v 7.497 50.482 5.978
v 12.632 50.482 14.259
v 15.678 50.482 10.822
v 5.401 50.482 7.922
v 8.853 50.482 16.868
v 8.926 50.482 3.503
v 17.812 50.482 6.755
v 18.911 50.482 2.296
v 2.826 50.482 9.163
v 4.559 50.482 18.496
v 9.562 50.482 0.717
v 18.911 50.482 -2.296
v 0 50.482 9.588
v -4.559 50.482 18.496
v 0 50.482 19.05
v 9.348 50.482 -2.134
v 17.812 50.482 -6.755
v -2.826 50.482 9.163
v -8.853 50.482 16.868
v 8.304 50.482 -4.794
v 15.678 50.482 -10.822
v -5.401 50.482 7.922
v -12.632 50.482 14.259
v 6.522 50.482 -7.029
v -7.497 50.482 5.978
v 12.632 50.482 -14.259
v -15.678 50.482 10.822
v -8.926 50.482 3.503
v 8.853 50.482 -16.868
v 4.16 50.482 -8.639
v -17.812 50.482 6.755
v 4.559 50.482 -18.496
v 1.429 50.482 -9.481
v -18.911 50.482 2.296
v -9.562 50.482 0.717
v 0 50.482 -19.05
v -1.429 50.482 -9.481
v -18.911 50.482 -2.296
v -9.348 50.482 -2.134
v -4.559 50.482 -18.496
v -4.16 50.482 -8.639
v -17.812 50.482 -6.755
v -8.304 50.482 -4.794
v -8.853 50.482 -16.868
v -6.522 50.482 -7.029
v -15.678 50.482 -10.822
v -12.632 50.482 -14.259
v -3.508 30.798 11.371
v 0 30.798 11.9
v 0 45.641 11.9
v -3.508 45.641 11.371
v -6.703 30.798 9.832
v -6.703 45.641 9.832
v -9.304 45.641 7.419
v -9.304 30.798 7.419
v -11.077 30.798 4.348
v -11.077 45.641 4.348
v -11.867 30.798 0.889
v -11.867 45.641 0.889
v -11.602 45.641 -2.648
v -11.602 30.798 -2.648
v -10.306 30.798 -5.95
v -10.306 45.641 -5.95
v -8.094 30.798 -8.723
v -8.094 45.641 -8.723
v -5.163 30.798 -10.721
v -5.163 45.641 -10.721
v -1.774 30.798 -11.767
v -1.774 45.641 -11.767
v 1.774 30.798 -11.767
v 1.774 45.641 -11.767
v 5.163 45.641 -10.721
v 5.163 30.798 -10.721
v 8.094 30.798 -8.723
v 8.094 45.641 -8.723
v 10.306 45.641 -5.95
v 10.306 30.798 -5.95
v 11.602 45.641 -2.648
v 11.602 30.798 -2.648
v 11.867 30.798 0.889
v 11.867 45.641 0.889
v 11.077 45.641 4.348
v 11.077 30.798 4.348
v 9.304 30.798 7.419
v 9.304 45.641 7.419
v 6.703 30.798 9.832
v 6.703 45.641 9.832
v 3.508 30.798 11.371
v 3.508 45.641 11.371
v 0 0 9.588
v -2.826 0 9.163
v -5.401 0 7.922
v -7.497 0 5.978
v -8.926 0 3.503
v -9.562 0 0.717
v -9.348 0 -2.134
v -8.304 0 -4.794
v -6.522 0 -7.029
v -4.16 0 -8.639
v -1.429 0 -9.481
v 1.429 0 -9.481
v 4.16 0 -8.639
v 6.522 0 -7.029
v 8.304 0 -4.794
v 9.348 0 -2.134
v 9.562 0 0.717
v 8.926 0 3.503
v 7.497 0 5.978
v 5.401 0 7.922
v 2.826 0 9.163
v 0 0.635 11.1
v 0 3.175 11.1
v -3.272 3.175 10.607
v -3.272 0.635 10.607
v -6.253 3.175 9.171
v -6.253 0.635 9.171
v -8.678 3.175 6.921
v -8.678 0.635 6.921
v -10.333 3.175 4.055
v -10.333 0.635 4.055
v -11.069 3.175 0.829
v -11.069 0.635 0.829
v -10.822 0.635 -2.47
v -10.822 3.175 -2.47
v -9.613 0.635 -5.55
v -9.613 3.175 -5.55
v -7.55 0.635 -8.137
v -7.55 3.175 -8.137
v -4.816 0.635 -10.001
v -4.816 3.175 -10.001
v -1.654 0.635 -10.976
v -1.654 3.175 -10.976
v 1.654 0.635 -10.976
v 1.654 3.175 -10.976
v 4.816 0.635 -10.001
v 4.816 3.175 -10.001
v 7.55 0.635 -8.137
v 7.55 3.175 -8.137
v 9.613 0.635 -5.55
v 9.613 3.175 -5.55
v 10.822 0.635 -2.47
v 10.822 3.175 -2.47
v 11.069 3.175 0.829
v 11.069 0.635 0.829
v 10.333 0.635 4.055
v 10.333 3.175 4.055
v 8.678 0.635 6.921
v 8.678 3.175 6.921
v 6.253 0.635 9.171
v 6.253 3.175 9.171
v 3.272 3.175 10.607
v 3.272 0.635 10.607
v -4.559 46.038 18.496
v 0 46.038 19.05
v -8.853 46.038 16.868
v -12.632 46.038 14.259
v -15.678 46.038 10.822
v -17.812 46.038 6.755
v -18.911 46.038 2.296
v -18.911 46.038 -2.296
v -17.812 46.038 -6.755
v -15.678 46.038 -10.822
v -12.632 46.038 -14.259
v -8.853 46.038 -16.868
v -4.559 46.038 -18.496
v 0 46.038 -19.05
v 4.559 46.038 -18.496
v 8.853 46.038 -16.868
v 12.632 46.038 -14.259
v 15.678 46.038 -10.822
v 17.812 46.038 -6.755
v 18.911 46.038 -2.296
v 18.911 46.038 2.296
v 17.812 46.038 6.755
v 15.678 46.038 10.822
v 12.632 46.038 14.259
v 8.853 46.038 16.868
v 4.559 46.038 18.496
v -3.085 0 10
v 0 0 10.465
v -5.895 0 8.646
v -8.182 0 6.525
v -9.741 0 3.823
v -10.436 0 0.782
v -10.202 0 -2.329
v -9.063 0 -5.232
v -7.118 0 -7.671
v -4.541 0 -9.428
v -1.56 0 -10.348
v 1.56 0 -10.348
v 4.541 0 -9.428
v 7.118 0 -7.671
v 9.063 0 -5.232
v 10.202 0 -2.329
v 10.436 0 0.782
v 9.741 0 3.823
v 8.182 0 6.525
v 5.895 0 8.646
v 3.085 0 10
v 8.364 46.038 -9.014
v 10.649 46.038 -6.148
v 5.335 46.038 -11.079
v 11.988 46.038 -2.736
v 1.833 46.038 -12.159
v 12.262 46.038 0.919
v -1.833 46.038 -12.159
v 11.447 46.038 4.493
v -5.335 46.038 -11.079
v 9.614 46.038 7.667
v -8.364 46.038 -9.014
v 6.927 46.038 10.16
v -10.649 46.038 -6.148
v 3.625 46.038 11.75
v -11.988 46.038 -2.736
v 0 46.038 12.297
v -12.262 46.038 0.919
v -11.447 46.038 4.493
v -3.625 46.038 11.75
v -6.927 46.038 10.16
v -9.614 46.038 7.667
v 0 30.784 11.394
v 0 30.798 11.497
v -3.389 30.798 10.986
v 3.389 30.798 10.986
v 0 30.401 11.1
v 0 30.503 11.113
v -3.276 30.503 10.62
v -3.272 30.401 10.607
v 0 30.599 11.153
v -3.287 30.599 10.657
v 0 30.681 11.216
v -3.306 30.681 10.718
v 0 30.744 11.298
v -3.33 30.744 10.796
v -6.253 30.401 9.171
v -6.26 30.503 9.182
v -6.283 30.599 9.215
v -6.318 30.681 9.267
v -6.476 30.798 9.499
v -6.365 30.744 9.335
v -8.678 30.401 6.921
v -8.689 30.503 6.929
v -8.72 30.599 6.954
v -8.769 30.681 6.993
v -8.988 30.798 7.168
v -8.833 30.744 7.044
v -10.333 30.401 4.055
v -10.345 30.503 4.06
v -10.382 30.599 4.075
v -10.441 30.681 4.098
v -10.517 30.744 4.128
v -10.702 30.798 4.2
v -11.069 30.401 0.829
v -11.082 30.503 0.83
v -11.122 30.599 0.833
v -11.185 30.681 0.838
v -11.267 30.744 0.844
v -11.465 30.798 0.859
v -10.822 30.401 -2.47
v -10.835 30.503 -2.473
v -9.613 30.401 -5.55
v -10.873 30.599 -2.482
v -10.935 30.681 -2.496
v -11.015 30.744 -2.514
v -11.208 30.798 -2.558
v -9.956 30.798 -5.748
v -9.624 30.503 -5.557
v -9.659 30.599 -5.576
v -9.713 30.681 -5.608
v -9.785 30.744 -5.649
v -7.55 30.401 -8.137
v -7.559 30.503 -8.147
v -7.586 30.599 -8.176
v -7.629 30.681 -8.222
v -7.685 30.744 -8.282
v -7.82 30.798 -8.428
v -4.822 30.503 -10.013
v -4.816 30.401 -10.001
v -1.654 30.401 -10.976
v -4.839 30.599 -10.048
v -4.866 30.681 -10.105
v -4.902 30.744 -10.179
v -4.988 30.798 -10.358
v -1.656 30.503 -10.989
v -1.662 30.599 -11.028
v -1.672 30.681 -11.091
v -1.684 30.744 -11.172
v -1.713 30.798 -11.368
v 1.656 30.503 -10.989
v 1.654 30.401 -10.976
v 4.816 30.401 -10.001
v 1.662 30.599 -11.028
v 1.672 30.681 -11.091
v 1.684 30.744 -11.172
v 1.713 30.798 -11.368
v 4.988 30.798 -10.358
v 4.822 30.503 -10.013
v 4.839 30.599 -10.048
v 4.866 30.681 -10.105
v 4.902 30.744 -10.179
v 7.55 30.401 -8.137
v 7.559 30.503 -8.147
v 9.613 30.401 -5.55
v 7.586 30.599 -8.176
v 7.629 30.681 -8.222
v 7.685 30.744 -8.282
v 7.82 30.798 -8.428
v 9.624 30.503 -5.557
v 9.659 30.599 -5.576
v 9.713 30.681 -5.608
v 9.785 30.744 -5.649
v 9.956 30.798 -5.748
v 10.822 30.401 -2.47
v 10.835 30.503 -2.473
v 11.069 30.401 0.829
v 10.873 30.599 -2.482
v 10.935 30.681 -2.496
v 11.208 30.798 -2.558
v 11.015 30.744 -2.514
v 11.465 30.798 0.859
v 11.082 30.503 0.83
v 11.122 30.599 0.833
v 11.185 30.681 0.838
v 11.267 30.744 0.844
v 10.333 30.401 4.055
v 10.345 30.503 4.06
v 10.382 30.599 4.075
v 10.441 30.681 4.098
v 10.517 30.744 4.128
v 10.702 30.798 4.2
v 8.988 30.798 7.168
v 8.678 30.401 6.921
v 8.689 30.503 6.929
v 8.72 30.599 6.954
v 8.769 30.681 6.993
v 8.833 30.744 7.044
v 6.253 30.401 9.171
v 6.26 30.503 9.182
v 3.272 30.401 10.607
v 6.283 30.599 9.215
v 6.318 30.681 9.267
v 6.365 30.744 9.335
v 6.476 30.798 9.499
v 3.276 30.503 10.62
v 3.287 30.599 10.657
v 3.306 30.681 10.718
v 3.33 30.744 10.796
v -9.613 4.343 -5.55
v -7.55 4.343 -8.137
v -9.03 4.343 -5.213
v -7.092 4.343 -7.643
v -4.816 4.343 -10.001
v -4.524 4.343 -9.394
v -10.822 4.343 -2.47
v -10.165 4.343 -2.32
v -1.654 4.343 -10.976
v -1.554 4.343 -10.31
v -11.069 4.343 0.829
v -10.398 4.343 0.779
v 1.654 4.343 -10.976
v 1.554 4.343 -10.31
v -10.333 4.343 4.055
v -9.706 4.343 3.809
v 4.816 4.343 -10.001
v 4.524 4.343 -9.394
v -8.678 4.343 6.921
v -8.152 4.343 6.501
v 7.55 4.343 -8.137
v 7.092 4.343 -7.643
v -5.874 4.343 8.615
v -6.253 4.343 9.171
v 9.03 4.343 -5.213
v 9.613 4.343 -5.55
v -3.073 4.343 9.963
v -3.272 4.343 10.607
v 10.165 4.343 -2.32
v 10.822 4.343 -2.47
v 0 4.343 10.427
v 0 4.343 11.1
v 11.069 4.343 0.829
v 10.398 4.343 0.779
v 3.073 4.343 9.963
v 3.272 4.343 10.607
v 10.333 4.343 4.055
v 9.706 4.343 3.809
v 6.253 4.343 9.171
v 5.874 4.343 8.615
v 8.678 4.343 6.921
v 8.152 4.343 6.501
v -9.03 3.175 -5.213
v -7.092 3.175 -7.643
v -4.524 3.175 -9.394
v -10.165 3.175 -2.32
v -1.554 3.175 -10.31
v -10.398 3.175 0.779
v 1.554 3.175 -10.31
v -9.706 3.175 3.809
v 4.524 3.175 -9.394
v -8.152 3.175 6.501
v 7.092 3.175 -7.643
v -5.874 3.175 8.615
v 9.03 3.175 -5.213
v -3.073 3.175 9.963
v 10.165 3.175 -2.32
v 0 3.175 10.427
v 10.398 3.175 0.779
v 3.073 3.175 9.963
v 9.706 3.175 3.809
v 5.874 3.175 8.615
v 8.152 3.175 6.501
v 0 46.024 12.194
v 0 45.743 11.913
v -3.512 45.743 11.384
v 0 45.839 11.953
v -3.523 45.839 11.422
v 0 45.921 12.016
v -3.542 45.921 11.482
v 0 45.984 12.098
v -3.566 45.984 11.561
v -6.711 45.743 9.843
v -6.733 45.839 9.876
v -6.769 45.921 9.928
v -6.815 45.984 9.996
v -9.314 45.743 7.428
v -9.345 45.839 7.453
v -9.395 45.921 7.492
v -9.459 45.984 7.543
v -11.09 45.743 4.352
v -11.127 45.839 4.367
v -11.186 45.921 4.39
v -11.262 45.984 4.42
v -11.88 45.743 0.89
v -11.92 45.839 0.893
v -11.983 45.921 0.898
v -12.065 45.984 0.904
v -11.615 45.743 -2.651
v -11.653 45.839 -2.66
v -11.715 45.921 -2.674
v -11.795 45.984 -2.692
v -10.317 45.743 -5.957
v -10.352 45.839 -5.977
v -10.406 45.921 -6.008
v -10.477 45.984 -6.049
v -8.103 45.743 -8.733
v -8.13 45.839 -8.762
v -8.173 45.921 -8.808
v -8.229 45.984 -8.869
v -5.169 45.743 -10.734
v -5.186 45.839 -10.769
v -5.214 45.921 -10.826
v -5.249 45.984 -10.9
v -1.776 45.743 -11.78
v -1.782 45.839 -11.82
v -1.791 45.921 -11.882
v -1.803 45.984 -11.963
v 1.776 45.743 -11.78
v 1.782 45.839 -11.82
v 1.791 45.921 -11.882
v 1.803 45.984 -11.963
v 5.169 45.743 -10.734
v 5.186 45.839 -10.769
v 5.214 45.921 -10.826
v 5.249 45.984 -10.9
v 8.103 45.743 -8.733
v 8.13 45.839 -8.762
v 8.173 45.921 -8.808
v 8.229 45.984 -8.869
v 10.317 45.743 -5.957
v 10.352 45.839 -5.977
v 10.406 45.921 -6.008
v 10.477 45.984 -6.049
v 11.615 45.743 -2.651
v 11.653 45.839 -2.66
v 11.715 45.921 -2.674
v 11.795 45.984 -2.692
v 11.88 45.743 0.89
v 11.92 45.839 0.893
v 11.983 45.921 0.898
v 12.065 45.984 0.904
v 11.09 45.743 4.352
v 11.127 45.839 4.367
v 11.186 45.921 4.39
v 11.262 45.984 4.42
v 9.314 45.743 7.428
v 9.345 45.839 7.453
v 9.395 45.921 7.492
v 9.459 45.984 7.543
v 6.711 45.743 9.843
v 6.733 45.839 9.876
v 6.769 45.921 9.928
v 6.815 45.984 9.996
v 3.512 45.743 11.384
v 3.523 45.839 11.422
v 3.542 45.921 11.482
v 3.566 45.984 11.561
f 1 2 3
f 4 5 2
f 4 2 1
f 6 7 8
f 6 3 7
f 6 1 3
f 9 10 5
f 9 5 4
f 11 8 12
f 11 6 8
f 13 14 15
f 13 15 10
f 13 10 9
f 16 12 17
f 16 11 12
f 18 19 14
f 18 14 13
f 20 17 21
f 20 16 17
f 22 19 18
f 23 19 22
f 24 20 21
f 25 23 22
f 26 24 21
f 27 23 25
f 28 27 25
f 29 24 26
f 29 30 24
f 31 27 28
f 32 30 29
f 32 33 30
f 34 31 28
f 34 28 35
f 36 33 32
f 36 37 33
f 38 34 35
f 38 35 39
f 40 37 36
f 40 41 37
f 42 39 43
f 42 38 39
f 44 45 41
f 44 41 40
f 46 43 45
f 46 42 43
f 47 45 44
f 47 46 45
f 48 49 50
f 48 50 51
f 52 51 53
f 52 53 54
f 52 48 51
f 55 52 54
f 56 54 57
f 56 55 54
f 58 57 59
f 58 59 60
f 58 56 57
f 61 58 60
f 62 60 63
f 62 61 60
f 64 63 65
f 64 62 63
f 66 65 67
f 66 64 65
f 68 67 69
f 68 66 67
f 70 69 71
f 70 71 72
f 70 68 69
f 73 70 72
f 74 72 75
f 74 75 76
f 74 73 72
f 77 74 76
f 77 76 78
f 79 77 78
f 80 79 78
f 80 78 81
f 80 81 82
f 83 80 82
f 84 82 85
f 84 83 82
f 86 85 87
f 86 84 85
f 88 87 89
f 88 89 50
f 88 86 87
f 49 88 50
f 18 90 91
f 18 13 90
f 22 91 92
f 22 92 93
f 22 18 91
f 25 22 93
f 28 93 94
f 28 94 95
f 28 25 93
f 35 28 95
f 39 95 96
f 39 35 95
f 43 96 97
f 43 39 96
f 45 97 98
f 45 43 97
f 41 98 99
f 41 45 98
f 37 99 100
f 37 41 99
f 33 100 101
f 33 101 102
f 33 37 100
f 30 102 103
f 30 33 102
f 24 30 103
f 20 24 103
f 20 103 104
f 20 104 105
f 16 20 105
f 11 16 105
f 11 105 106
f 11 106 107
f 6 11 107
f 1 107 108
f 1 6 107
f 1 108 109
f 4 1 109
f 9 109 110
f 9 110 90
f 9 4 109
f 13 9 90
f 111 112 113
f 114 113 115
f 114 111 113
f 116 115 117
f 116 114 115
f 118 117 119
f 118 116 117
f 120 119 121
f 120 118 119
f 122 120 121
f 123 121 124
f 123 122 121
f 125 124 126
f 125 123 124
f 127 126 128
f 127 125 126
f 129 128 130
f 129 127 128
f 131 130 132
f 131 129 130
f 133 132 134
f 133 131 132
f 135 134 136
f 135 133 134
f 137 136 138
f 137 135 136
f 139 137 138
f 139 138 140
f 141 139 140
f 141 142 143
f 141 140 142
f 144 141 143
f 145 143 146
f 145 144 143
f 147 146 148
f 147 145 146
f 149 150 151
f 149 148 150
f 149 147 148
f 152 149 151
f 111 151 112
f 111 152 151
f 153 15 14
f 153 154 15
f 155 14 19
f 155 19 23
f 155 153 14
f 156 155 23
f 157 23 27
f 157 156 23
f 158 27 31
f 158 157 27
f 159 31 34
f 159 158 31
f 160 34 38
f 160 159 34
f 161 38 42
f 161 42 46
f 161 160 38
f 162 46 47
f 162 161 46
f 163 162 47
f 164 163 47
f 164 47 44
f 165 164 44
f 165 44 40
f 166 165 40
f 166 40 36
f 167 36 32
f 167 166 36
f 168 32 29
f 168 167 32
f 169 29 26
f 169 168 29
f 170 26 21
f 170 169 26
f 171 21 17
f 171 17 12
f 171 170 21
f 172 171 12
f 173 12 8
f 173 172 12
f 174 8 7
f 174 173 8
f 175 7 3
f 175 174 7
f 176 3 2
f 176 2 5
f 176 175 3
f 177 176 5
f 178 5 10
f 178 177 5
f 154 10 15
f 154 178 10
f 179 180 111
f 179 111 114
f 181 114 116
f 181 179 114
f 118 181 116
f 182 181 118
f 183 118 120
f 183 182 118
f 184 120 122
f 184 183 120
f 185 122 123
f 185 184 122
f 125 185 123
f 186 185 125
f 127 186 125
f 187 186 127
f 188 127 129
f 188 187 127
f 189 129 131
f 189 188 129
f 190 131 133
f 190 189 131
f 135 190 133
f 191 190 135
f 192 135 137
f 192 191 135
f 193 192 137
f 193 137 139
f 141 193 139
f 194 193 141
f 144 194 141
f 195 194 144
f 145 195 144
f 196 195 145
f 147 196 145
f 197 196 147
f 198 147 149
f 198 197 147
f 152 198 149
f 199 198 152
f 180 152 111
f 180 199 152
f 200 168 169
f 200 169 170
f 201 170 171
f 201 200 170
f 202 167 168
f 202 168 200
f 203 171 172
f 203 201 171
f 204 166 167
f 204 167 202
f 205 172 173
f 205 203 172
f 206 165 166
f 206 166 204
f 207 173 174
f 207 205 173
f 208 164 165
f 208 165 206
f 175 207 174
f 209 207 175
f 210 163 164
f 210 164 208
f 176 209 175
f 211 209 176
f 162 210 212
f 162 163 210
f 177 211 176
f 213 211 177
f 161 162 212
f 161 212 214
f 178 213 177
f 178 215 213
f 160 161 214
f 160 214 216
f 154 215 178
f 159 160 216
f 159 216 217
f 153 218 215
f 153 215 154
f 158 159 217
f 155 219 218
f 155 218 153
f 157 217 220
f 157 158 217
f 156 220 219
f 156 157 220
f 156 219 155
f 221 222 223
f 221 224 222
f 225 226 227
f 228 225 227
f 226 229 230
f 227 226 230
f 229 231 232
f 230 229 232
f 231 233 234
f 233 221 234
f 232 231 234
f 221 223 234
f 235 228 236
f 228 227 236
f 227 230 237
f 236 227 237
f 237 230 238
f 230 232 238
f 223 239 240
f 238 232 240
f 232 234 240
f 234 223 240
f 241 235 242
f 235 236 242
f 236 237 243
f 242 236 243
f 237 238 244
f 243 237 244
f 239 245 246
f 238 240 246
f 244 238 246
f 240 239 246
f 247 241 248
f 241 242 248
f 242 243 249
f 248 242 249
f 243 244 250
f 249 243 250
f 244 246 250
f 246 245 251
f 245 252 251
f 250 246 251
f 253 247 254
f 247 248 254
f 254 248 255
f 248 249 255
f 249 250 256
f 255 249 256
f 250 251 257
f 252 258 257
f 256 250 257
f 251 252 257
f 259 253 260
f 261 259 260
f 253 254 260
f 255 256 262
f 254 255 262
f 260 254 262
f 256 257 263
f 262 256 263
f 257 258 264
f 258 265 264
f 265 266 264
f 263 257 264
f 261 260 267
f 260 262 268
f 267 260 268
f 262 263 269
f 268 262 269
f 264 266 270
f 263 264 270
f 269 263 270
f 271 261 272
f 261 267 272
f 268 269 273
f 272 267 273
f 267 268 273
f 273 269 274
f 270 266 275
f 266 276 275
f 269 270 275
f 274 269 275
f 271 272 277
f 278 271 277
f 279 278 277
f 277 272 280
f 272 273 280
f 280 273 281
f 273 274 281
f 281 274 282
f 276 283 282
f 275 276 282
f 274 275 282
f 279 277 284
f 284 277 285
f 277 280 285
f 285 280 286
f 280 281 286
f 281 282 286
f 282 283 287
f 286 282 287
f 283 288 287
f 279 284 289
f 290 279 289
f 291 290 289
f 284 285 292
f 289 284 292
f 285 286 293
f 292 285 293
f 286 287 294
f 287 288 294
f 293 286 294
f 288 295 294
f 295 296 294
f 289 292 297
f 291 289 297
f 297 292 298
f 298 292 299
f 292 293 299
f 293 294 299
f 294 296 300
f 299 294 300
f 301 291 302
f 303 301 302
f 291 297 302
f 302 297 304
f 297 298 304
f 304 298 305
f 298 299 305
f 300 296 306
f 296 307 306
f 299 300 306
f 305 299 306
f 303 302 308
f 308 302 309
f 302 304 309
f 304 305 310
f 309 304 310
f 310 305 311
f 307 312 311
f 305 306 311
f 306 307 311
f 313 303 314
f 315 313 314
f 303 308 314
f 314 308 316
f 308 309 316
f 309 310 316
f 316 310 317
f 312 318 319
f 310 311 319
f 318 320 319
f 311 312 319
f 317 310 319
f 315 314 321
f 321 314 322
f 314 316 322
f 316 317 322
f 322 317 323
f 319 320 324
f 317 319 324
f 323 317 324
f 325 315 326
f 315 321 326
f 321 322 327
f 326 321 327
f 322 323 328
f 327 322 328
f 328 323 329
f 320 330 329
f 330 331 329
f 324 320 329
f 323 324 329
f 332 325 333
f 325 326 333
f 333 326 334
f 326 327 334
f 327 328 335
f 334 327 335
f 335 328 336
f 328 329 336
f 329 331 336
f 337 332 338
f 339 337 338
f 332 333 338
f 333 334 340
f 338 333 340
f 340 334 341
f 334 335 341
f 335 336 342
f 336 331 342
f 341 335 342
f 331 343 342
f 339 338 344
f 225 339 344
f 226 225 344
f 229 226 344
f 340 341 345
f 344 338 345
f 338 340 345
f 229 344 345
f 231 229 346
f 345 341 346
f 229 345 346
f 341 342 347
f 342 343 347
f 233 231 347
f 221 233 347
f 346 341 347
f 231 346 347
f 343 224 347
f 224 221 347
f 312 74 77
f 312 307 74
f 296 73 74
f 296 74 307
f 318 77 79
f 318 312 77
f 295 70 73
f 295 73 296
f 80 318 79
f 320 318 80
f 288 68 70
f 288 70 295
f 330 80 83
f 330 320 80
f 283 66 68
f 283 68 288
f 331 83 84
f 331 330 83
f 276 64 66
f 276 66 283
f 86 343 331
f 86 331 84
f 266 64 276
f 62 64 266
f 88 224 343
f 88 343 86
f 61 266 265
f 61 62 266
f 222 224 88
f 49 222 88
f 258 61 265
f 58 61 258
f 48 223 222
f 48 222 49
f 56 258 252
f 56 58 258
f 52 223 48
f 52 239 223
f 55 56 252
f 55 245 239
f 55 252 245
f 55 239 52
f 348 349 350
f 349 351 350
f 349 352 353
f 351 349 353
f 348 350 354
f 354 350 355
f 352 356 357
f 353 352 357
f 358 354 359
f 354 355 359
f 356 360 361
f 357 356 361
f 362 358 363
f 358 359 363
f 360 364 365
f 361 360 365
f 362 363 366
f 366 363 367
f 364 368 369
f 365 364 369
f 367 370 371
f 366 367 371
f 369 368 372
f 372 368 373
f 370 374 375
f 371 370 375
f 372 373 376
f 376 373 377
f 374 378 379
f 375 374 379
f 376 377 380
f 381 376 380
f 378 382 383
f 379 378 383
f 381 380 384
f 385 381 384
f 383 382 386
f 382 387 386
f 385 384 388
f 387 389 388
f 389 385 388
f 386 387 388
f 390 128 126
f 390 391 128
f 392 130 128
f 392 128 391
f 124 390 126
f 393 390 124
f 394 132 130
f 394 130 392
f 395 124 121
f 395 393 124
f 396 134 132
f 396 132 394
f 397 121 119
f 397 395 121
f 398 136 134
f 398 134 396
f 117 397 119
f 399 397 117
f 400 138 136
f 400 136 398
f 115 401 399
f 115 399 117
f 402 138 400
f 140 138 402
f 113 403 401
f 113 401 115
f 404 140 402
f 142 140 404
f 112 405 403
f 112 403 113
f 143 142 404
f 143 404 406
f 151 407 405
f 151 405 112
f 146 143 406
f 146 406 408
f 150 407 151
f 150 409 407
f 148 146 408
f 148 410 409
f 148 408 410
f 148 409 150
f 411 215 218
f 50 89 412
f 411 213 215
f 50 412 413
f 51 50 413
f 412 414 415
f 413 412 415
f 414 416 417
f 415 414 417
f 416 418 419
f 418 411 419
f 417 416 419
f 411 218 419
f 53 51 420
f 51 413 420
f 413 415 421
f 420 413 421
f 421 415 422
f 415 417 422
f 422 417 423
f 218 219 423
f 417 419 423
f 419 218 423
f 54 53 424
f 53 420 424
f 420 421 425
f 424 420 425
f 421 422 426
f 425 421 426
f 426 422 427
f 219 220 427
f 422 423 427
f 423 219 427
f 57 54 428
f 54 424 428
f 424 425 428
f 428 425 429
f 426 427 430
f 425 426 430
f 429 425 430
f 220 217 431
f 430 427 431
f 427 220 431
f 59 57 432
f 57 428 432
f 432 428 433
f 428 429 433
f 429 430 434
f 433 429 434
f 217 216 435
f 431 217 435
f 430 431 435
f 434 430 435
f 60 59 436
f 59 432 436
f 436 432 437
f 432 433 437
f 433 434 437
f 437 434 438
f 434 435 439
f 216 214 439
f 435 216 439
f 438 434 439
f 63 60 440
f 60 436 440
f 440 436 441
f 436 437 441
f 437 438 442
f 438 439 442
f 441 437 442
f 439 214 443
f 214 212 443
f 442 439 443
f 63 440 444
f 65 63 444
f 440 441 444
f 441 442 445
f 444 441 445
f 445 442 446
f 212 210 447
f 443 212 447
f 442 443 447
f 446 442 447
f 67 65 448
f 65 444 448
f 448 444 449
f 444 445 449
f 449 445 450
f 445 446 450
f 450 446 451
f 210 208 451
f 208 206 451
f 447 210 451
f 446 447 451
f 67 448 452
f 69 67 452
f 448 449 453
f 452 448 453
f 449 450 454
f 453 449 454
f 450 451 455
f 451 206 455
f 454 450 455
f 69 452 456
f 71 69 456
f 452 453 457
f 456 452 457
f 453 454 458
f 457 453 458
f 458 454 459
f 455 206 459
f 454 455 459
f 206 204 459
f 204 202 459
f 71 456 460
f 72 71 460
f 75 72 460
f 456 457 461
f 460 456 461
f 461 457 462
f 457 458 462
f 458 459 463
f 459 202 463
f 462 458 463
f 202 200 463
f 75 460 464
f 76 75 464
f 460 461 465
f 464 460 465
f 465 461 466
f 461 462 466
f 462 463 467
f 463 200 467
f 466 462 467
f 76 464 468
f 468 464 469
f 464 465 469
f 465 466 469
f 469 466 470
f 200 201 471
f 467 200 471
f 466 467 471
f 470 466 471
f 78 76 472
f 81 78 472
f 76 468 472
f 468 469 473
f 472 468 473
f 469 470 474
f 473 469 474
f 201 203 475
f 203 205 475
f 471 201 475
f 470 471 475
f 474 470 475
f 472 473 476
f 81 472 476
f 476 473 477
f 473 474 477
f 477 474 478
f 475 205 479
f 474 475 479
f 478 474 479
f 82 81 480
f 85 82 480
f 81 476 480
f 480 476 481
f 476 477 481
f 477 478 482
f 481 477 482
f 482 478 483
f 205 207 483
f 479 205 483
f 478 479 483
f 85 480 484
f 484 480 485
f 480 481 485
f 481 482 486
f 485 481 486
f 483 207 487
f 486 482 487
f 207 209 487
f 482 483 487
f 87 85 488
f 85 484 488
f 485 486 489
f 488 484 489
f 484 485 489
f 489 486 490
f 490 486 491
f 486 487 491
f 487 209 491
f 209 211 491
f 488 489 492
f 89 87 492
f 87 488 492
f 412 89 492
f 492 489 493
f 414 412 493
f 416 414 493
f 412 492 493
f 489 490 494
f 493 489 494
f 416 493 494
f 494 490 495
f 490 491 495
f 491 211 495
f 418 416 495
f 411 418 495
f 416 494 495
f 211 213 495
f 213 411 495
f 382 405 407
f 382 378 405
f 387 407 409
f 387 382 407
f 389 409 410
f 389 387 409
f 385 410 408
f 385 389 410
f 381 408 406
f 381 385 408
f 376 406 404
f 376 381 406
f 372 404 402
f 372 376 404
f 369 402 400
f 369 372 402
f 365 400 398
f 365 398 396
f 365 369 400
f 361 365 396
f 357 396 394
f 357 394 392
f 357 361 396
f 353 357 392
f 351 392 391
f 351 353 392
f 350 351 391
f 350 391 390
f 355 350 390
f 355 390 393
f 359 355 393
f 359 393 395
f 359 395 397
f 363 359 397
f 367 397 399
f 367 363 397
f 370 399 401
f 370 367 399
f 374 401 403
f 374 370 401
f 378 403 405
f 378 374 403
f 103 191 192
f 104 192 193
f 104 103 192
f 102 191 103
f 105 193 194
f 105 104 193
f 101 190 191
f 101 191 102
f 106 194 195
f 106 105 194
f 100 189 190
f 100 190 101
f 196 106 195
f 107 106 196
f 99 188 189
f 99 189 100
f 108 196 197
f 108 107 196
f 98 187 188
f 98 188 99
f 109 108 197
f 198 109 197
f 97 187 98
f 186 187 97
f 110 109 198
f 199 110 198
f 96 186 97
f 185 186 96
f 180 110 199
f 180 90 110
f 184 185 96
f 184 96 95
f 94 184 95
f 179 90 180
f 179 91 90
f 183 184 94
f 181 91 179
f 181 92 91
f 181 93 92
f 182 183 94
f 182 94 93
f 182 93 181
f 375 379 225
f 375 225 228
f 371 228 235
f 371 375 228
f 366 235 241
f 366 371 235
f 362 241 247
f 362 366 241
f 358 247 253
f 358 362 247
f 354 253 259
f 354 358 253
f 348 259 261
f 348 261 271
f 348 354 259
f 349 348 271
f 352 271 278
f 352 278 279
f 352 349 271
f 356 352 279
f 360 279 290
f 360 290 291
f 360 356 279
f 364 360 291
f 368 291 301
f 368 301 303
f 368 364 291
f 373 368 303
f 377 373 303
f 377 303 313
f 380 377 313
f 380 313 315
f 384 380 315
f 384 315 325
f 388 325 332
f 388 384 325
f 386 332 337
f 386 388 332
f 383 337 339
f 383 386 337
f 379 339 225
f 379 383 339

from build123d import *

# Parameters (mm, degrees)
CHAMFER1_SIZE = 0.635
SKETCH3_W     = 0.6731
SKETCH3_H     = 1.1684
FILLET1_R     = 0.396875


with BuildPart() as part:
    # Sketch1 → Revolve1 (revolve)
    with BuildSketch(Plane.XY, mode=Mode.PRIVATE) as revolve1_sk:
        Polygon((-19.05, 50.4825), (-19.05, 46.0375), (-11.8999, 46.0375), (-11.8999, 30.7975), (-11.0998, 30.7975), (-11.0998, 0), (-9.5885, 0), (-9.5885, 50.4825), align=None)
    revolve(revolve1_sk.sketch.rotate(Axis((0, 18.282782329, 0), (0, -1, 0)), 270), axis=Axis((0, 18.282782329, 0), (0, -1, 0)))  # turned: the seam where the file's is

    # Chamfer1
    chamfer1_edges = [part.edges().sort_by_distance(p)[0] for p in [
        (0, 0, -11.0998),
    ]]
    chamfer(chamfer1_edges, length=CHAMFER1_SIZE)

    # Sketch3 → Cut-Revolve1 (revolve, cut)
    with BuildSketch(Plane.XY, mode=Mode.PRIVATE) as cut_revolve1_sk:
        with Locations((-10.76325, 3.7592)):
            Rectangle(SKETCH3_W, SKETCH3_H)
    revolve(cut_revolve1_sk.sketch.rotate(Axis((0, -2.070057214, 0), (0, 1, 0)), 90), axis=Axis((0, -2.070057214, 0), (0, 1, 0)), mode=Mode.SUBTRACT)  # turned: the seam where the file's is

    # Fillet1
    fillet1_edges = [part.edges().sort_by_distance(p)[0] for p in [
        (0, 46.0375, -11.8999),
        (0, 30.7975, -11.0998),
    ]]
    fillet(fillet1_edges, radius=FILLET1_R)


solid = part.part
